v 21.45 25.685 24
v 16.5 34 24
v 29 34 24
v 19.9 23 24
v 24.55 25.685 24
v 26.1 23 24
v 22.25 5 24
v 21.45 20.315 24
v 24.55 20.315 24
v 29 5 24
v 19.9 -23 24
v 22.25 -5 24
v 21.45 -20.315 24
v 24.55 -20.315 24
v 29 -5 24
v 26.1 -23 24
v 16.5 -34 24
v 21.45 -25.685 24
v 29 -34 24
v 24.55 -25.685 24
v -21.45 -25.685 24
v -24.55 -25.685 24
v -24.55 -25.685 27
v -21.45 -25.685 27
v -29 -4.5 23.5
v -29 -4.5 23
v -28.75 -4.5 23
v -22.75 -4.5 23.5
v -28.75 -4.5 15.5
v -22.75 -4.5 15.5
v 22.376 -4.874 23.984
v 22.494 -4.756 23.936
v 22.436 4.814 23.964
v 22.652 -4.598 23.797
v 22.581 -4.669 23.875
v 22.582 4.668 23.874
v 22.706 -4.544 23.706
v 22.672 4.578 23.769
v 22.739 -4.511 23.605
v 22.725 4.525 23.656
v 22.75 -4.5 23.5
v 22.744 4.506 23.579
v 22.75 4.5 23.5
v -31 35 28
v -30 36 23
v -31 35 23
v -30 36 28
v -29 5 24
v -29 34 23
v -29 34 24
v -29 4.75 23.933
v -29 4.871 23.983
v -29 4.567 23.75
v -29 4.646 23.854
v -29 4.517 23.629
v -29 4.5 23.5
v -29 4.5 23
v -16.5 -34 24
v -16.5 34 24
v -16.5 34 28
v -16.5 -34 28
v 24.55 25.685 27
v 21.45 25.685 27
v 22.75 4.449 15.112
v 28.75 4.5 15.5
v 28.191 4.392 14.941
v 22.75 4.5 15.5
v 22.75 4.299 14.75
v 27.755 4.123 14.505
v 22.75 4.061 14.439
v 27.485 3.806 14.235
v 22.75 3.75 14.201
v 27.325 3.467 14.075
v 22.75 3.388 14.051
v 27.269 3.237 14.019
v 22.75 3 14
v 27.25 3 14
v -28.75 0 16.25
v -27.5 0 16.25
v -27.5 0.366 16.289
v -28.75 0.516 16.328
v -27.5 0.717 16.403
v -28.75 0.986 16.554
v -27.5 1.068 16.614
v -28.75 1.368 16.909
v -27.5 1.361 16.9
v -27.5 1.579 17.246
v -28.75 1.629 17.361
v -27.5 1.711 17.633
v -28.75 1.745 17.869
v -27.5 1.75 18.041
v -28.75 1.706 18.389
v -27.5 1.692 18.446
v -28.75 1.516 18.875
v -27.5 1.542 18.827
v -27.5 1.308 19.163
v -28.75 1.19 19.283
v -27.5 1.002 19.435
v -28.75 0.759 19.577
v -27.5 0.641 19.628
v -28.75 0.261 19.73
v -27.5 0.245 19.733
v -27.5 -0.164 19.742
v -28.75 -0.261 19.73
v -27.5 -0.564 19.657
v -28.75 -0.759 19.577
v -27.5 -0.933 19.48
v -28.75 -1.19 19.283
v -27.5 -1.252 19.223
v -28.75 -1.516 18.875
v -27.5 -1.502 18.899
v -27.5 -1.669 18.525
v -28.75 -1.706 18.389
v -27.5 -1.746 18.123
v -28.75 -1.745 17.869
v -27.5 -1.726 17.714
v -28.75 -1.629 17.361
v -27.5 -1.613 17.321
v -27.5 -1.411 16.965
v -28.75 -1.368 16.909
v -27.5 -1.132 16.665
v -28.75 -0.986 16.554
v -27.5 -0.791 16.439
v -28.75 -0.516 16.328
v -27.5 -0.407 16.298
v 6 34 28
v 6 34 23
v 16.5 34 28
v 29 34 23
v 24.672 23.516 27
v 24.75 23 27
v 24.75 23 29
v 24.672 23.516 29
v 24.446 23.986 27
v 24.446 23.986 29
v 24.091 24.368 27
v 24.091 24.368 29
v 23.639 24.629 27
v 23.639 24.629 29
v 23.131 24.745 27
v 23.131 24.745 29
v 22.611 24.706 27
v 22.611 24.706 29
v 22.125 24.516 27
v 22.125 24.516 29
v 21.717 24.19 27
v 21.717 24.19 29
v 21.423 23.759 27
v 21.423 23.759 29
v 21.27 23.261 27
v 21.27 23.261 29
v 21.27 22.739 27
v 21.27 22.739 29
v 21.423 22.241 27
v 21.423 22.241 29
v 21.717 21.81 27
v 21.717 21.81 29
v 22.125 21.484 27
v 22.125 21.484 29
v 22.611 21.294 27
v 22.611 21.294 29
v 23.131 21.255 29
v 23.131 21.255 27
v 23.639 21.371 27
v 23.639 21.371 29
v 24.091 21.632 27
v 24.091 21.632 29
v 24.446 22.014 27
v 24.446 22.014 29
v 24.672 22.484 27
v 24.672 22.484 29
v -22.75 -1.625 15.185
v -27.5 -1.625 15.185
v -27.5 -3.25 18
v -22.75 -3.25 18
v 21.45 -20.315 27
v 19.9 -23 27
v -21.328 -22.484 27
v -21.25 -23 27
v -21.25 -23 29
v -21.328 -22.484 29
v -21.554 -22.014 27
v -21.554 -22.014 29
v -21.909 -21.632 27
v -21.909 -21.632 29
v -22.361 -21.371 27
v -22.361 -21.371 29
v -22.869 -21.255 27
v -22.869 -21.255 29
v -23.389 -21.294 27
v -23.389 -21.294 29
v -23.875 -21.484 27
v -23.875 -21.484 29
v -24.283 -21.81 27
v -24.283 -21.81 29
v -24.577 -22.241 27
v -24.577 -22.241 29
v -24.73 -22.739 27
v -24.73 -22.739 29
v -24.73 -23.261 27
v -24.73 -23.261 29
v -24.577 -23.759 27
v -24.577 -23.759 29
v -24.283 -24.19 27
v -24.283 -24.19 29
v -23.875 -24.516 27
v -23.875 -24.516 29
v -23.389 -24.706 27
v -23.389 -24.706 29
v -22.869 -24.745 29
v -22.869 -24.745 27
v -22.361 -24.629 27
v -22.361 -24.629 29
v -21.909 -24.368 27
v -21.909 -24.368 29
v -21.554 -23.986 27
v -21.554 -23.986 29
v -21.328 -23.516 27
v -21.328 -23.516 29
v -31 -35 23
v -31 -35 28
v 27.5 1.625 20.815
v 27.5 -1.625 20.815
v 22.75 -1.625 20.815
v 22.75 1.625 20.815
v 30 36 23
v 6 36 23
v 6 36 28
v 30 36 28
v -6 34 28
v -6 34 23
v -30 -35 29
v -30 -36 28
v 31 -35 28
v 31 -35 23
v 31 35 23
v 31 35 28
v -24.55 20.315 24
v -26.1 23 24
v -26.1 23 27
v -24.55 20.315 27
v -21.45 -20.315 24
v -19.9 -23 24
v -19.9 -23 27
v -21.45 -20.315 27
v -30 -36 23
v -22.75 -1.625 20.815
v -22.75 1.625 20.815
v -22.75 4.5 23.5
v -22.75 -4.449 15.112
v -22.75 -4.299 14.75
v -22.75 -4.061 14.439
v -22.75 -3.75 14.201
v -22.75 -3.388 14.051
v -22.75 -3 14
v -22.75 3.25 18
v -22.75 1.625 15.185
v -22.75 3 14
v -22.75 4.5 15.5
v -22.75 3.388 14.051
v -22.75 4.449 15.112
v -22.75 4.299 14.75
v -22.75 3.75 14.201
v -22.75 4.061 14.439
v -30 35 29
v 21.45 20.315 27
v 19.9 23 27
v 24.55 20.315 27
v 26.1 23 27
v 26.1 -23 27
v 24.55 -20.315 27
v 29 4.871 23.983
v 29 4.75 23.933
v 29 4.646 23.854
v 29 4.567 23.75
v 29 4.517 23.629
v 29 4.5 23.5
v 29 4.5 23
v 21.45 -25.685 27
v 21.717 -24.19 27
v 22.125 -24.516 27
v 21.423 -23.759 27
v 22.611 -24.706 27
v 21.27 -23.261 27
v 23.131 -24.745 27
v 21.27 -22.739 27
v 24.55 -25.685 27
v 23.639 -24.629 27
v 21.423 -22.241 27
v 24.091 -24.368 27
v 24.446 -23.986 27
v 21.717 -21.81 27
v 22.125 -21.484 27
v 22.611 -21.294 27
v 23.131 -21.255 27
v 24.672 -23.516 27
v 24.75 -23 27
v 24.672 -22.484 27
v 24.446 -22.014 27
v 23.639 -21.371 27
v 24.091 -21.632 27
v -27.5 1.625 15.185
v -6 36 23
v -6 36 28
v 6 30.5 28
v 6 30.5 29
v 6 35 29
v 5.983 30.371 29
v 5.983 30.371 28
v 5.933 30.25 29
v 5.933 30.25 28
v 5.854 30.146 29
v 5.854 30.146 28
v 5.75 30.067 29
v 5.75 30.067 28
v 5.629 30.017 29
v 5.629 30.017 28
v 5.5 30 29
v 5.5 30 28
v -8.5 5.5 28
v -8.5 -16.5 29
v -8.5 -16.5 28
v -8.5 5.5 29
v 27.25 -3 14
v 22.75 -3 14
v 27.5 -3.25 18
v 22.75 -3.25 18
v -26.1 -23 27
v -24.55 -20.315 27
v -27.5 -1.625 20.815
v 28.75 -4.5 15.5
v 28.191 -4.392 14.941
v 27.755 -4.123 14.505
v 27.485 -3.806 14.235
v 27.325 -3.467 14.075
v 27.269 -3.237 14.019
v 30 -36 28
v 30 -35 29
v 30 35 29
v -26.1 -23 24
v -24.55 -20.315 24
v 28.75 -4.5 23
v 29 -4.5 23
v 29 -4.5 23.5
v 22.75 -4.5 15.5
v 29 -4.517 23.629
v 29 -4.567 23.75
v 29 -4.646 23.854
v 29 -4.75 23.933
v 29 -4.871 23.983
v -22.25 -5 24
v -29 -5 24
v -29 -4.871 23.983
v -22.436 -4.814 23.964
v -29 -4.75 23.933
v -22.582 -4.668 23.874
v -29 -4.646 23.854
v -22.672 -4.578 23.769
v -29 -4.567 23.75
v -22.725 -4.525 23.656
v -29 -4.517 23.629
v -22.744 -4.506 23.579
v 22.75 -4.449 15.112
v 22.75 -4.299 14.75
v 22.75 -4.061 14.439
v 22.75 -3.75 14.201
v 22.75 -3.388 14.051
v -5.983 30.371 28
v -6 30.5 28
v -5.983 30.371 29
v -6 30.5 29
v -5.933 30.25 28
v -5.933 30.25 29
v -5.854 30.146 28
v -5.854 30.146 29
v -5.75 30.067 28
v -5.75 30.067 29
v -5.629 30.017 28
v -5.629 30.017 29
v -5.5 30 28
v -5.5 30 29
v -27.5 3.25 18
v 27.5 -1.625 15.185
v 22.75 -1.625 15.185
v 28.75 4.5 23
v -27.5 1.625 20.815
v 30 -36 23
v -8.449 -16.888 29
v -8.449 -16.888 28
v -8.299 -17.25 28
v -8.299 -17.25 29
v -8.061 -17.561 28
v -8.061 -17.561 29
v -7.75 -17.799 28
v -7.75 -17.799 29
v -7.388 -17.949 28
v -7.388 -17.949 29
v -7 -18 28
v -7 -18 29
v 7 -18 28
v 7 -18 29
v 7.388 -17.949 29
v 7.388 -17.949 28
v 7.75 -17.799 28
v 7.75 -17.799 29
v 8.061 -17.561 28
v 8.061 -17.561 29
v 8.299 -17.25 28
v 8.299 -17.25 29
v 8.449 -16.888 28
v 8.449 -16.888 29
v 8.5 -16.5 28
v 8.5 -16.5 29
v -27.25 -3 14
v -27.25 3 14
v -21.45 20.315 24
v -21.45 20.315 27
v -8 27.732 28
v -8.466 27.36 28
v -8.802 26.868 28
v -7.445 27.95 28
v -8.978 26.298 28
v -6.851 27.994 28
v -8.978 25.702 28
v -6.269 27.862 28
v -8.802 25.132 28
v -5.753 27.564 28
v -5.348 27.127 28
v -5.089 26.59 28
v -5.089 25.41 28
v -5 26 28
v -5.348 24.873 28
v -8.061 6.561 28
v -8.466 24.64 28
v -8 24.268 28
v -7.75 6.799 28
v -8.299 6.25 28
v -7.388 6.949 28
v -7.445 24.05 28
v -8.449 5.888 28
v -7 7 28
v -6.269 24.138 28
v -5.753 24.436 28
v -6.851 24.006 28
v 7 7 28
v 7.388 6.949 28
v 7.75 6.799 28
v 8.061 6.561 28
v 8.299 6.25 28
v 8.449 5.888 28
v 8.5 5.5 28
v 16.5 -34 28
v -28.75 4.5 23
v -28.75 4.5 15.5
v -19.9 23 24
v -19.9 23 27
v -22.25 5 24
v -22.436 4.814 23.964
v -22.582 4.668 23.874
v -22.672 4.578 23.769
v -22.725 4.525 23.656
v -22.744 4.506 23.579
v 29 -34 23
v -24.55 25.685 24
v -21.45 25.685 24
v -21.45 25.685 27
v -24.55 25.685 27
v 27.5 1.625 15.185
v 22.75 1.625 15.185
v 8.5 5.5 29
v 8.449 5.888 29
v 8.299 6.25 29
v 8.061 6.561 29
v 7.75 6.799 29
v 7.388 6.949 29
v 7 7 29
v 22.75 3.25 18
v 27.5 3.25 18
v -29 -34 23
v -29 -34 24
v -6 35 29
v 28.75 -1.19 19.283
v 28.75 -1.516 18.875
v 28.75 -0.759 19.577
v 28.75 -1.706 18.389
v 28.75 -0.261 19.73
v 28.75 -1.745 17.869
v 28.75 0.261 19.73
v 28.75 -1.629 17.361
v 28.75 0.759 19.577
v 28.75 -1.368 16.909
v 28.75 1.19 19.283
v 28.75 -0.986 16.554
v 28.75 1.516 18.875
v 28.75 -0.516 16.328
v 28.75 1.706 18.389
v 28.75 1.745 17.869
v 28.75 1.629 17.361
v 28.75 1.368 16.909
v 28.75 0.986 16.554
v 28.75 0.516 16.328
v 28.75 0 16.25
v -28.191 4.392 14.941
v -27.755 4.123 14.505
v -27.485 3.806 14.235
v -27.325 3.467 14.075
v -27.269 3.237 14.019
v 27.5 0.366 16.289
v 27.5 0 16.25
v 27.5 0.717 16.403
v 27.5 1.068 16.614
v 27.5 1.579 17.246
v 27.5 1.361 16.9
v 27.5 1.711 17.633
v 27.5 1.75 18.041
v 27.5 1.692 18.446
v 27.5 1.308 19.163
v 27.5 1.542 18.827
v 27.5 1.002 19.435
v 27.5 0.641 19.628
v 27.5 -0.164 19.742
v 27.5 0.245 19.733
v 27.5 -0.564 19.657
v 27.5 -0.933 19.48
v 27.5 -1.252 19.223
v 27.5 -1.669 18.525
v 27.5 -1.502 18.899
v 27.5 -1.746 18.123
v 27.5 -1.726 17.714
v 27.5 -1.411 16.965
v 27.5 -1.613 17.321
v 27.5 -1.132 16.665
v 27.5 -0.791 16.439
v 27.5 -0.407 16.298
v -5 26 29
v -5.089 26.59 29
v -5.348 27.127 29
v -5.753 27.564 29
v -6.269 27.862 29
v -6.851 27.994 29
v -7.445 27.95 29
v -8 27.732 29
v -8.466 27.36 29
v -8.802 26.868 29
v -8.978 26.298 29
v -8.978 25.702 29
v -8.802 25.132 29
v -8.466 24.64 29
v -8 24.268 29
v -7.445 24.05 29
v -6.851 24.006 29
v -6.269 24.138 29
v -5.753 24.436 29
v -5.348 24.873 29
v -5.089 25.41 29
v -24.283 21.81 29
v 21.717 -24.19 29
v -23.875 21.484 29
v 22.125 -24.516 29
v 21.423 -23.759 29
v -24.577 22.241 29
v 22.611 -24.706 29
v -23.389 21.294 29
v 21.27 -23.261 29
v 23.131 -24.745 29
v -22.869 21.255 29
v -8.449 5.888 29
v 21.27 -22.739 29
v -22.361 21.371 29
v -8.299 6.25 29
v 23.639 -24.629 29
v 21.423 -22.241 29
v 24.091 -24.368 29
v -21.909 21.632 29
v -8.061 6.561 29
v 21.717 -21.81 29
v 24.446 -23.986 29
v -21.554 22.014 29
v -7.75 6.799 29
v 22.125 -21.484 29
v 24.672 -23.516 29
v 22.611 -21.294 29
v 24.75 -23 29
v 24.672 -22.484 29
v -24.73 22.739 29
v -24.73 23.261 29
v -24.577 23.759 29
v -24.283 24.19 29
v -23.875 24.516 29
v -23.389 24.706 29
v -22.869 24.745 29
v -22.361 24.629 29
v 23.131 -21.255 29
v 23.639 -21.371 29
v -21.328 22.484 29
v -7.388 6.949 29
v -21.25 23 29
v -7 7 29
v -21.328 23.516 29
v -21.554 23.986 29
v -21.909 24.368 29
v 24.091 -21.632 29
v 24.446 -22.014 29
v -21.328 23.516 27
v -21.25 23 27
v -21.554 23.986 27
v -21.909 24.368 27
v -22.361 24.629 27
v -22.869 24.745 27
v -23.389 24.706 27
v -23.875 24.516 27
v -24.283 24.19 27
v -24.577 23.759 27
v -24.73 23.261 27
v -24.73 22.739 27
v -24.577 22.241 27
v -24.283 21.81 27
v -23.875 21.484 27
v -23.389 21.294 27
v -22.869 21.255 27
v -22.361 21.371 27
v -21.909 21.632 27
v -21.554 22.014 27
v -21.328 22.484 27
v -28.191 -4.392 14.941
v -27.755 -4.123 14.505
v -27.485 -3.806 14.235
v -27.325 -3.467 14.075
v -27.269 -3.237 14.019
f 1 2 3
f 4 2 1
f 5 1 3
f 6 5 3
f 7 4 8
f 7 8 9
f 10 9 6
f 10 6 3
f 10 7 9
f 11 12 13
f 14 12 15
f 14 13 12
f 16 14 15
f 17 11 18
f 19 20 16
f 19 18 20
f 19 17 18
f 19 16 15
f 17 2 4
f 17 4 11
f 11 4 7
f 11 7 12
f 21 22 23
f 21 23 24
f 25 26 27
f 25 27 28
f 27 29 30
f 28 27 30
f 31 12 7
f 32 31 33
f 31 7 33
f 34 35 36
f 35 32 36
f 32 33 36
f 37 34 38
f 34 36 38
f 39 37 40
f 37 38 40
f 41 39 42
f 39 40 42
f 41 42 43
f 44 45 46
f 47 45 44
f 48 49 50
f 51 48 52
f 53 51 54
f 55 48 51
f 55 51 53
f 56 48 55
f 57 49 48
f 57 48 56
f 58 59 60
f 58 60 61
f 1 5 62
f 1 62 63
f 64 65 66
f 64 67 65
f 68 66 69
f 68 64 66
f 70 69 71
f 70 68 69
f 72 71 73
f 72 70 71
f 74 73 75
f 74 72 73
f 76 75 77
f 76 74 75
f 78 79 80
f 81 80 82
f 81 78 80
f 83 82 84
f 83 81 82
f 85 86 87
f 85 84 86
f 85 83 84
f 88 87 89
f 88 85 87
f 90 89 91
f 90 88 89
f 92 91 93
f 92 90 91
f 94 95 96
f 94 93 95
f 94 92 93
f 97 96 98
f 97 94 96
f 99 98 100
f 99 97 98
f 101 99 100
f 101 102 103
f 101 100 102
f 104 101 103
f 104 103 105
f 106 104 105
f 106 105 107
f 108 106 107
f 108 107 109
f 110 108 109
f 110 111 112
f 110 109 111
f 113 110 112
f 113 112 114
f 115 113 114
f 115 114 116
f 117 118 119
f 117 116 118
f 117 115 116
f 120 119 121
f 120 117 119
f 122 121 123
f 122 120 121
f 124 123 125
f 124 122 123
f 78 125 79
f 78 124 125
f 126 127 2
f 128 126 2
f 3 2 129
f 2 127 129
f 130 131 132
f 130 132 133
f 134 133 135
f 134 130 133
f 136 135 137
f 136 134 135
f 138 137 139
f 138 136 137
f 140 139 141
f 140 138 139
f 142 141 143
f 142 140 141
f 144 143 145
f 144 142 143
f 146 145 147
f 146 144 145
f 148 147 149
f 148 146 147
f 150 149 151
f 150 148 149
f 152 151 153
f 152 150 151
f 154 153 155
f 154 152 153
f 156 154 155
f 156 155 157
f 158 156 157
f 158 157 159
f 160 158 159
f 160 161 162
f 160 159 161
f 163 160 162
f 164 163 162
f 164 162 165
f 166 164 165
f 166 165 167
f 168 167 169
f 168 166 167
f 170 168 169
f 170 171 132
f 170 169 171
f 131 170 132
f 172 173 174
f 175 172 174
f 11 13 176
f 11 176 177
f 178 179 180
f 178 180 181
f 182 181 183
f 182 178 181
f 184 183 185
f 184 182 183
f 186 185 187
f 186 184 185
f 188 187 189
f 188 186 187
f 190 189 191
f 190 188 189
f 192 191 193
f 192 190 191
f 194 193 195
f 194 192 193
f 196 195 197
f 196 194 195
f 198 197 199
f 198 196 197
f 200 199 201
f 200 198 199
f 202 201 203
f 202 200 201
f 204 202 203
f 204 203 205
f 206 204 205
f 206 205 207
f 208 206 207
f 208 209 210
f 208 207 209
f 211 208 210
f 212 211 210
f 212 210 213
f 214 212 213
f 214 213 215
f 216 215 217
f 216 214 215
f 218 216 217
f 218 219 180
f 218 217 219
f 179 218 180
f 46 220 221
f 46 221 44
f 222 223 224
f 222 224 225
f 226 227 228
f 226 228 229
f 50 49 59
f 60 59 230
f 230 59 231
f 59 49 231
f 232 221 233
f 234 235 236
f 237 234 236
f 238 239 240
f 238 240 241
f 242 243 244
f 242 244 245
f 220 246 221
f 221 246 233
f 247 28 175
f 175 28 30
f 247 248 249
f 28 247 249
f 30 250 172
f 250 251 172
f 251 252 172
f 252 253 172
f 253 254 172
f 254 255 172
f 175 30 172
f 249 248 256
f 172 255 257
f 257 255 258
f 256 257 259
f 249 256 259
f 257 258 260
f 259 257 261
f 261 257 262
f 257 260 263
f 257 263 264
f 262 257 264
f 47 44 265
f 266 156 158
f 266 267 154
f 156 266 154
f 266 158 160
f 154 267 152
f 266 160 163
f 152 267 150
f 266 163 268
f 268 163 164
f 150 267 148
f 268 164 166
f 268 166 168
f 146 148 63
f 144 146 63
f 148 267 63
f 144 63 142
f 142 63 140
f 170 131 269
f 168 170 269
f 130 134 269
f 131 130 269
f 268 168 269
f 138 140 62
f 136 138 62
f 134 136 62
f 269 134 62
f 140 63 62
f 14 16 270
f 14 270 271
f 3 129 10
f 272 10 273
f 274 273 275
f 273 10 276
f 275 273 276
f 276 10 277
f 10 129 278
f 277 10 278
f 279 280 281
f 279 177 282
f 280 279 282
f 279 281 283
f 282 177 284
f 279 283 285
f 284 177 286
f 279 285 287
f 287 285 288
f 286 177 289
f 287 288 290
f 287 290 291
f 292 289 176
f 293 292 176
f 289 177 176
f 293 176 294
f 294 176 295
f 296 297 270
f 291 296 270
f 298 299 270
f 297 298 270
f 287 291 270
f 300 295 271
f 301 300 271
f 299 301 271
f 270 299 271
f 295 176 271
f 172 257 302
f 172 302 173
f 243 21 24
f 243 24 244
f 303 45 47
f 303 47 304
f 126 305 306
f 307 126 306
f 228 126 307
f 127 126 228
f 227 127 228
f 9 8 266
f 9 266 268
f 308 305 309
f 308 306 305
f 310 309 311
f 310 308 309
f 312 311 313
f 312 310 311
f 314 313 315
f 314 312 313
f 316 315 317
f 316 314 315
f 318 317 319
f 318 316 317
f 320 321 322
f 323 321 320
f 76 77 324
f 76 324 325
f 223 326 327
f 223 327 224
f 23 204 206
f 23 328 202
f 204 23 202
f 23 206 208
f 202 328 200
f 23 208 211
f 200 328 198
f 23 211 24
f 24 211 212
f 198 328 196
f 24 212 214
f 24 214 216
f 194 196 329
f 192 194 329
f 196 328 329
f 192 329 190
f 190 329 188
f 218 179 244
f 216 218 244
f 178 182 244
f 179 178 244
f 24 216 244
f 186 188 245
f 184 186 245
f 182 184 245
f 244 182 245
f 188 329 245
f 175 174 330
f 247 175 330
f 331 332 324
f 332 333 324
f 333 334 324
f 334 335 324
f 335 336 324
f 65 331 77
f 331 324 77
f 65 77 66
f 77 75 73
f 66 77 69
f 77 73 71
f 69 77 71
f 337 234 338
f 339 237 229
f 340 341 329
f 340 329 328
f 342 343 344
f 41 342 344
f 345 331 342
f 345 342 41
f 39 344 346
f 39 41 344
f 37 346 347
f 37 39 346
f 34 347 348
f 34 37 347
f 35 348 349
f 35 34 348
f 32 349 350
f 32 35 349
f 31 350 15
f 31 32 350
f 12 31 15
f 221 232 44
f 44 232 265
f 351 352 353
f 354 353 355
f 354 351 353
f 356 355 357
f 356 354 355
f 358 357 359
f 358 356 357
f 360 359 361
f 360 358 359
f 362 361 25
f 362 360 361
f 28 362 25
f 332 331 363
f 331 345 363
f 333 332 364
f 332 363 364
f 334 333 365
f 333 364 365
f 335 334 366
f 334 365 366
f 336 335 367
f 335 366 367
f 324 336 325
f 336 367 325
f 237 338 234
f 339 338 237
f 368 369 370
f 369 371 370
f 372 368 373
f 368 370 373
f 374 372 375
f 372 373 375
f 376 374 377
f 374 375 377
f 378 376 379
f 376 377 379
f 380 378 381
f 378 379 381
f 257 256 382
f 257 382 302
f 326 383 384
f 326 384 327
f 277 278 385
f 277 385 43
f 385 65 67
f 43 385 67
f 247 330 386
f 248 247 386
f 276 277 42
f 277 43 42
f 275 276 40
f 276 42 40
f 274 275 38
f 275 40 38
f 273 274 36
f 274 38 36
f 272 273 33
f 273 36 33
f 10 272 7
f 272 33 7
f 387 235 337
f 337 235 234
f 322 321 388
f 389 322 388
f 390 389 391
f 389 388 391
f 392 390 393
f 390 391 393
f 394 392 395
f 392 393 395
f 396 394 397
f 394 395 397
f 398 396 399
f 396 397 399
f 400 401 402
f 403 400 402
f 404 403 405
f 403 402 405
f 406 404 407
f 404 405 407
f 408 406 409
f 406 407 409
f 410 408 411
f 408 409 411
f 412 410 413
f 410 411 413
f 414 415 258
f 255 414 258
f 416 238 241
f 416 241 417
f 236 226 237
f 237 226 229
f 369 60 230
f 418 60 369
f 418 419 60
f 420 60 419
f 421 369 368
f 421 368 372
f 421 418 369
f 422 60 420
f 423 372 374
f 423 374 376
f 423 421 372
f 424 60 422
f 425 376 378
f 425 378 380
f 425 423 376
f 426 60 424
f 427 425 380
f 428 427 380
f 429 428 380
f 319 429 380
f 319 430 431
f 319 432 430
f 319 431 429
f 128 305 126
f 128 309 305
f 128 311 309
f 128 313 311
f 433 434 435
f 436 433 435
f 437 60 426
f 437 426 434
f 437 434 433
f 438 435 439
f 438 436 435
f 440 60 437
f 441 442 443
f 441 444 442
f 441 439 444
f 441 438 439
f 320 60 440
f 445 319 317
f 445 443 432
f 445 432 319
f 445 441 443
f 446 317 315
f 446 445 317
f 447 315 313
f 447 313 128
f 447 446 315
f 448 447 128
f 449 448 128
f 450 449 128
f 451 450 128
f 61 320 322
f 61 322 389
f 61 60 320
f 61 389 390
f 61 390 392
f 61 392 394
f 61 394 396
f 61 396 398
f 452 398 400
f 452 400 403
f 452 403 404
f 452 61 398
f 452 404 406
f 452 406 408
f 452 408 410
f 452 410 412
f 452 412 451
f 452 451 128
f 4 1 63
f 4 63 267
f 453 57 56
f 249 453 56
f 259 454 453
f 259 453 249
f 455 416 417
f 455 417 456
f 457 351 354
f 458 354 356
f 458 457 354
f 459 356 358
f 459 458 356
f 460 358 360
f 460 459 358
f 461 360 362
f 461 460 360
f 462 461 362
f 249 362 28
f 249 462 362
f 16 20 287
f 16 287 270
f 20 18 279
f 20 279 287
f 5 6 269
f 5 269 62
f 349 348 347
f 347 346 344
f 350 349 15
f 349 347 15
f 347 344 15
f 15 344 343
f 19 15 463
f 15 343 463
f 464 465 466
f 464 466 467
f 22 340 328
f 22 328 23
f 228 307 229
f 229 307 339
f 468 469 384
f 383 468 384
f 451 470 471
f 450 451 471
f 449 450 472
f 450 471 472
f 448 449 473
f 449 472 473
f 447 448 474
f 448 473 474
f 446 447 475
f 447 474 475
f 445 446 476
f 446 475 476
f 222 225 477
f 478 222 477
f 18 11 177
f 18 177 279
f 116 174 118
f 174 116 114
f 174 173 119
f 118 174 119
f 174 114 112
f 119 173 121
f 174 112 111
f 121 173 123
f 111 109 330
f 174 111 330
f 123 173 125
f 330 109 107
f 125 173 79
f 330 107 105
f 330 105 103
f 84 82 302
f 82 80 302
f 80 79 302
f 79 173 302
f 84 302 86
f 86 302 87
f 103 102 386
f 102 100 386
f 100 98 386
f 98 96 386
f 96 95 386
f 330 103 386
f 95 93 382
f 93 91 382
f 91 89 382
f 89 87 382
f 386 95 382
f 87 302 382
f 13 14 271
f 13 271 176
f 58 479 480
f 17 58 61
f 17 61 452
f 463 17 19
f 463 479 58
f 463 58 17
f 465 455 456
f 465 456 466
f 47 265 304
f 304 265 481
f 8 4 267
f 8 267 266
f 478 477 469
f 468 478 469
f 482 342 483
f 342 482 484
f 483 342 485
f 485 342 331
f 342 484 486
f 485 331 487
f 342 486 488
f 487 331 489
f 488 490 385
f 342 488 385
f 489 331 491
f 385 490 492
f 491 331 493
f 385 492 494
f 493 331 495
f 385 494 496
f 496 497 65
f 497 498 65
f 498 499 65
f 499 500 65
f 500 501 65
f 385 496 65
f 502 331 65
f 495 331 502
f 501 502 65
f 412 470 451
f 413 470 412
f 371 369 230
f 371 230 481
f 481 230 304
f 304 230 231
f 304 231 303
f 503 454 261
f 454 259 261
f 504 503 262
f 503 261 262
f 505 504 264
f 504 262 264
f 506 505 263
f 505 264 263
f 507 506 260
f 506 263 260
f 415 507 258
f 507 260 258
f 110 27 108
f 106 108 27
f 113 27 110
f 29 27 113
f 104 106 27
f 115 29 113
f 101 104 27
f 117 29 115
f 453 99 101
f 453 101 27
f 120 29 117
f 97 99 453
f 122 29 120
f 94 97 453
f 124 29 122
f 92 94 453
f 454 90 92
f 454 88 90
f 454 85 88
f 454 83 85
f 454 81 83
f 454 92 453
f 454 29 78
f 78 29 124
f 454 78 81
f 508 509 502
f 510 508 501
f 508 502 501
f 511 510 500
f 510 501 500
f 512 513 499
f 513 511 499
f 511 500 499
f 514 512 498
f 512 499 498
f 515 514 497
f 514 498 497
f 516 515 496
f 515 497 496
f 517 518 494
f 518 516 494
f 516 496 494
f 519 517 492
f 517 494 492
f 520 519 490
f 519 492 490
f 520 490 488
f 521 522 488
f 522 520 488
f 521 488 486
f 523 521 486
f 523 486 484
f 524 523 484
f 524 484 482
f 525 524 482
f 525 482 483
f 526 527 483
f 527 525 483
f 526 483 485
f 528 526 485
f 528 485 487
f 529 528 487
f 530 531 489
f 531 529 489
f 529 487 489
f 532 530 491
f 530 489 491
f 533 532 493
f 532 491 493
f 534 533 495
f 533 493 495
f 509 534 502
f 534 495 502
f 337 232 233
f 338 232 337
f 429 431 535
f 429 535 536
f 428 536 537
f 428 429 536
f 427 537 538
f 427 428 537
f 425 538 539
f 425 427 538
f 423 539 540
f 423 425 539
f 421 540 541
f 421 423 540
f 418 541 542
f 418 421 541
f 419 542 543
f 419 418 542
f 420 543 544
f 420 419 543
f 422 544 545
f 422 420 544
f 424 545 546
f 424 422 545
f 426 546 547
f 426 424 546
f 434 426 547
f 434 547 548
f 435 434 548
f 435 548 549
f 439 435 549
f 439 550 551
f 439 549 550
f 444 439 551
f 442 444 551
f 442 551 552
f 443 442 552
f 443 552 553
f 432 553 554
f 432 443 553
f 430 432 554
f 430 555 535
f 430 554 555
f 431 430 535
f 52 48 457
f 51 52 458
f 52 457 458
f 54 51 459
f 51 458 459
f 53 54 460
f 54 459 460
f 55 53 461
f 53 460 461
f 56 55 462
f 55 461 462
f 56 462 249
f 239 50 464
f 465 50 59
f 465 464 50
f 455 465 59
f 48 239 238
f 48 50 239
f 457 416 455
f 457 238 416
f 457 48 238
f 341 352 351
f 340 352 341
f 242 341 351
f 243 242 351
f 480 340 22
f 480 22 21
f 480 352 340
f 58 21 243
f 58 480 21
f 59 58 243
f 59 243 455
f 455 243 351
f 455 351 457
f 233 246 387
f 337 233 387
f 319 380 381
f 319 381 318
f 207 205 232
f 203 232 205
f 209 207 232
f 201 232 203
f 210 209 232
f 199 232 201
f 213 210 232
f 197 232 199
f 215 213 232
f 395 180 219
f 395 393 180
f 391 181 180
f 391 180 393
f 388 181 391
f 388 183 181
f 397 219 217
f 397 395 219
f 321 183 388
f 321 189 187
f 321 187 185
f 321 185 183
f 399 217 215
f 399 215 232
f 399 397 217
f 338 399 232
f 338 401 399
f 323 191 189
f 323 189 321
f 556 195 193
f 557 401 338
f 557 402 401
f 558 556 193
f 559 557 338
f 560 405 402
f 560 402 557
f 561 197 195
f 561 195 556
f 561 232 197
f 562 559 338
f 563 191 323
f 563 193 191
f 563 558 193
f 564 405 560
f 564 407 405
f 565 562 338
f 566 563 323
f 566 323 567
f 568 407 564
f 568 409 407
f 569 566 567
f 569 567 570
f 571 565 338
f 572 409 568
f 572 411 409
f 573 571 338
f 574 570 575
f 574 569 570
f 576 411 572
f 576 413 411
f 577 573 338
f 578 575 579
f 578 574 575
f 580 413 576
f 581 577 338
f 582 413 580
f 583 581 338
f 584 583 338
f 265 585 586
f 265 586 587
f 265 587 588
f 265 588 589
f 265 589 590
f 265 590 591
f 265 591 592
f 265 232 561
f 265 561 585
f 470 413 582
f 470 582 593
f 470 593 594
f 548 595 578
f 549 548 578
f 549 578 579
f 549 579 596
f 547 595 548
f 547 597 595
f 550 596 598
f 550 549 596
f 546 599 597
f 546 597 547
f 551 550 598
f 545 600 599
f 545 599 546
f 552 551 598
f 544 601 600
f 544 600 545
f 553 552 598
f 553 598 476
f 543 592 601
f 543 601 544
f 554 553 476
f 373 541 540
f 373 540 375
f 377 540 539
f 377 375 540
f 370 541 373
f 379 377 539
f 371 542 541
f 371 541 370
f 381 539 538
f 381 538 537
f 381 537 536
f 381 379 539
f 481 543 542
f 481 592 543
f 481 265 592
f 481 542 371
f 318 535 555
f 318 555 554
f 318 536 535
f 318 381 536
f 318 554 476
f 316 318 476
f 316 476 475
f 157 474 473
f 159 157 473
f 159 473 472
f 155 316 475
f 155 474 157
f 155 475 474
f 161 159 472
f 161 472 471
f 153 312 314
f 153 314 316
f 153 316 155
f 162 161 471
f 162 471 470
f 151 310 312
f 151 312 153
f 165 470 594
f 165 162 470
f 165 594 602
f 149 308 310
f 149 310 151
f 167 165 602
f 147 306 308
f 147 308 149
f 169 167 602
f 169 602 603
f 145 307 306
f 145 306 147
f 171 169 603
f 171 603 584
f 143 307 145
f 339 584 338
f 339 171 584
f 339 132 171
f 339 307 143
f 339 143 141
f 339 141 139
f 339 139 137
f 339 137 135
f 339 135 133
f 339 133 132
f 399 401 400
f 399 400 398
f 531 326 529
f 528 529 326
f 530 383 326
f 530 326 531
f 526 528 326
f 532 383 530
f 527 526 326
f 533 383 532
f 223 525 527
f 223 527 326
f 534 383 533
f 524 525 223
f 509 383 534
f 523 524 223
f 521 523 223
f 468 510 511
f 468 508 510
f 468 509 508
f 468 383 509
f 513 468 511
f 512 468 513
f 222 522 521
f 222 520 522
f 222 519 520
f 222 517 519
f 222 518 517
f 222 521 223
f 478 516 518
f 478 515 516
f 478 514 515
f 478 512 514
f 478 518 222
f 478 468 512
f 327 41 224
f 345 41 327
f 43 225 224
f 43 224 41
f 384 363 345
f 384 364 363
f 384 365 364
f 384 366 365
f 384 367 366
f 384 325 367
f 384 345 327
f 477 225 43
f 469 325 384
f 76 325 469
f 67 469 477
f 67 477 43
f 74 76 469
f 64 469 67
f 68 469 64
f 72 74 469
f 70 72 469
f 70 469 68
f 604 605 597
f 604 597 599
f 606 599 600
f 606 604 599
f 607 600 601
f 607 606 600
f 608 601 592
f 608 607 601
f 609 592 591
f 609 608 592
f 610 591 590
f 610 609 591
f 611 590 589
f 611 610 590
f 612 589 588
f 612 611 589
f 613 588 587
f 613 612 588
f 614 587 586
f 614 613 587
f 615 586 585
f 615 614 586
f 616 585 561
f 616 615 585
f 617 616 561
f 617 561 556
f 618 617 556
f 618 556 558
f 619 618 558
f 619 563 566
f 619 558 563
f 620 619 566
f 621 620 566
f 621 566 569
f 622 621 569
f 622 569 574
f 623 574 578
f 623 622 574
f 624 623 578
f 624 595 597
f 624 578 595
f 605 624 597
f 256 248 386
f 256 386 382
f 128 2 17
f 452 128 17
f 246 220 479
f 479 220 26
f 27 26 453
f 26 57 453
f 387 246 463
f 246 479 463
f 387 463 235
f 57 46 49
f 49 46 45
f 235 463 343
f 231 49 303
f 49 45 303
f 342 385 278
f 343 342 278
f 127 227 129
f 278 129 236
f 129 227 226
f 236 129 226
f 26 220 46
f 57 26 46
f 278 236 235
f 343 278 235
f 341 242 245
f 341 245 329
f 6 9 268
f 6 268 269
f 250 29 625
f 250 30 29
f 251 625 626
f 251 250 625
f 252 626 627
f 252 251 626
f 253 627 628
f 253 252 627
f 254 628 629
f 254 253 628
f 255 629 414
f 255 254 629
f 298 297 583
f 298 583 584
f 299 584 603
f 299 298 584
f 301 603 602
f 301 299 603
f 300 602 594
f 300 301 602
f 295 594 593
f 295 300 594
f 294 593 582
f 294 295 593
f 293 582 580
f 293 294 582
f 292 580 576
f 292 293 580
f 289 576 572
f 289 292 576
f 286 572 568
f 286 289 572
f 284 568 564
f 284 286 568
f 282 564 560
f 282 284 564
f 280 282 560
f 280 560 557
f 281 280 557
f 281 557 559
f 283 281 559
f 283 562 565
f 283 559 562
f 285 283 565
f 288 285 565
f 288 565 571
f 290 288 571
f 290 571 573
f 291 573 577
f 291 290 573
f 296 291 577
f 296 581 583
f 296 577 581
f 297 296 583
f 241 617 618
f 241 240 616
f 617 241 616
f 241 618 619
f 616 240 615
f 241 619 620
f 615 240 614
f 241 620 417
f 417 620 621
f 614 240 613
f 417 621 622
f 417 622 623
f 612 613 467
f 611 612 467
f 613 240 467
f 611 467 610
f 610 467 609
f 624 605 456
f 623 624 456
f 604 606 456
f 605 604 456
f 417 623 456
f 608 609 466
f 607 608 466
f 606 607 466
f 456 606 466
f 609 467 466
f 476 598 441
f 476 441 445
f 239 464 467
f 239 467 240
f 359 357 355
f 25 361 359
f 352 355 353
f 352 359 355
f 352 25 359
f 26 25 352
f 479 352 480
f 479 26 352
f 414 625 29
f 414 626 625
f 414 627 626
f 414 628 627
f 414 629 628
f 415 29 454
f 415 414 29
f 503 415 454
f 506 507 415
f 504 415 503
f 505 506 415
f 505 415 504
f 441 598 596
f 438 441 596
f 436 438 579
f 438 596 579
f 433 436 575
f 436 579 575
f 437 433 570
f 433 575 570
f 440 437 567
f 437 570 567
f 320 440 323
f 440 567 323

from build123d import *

# Parameters (mm, degrees)
CYLINDER021_R            = 2
CYLINDER021_DEPTH        = 15
BOX014_W                 = 4
BOX014_H                 = 9
BOX014_DEPTH             = 3
PRISM010_DEPTH           = 10
PRISM010_ROLL_ANGLE      = -90.000052
PRISM010_PITCH_ANGLE     = -59.999967
PRISM010_PLACEMENT_ANGLE = 90.000052
CYLINDER019_R            = 1.75
CYLINDER019_DEPTH        = 68
CYLINDER019_PITCH_ANGLE  = 90
BOX013_W                 = 6
BOX013_H                 = 9
BOX013_DEPTH             = 11
CHAMFER008_SIZE          = 1.5
FILLET009_R              = 1.5
BOX012_W                 = 12
BOX012_H                 = 16
BOX012_DEPTH             = 10
PAD021_DEPTH             = 35
CYLINDER005_R            = 1.75
CYLINDER005_DEPTH        = 50
CYLINDER007_R            = 1.75
CYLINDER007_DEPTH        = 50
CYLINDER006_R            = 1.75
CYLINDER006_DEPTH        = 50
CYLINDER004_R            = 1.75
CYLINDER004_DEPTH        = 50
PRISM004_DEPTH           = 10
PRISM005_DEPTH           = 10
PRISM006_DEPTH           = 10
PRISM007_DEPTH           = 10
SKETCH001_W              = 58
SKETCH001_H              = 68
PAD001_DEPTH             = 2
SKETCH002_W              = 33
SKETCH002_H              = 68
PAD002_DEPTH             = 6
BOX009_W                 = 62
BOX009_H                 = 72
BOX009_DEPTH             = 6
CHAMFER001_SIZE          = 1
FILLET010_R              = 0.5


with BuildPart() as cilindro017:
    # Cylinder021 → Cylinder021 (new body)
    with BuildSketch(Plane(origin=(-7, 26, 17), x_dir=(1, 0, 0), z_dir=(0, 0, 1))):
        Circle(CYLINDER021_R)
    extrude(amount=CYLINDER021_DEPTH)


with BuildPart() as cubo014:
    # Box014 → Box014 (new body)
    with BuildSketch(Plane(origin=(-29.75, -4.5, 23), x_dir=(1, 0, 0), z_dir=(0, 0, 1))):
        with Locations((2, 4.5)):
            Rectangle(BOX014_W, BOX014_H)
    extrude(amount=BOX014_DEPTH)


with BuildPart() as prisma010:
    # Prism010 → Prism010 (new body)
    with BuildSketch(Plane.XY):
        Polygon((3.25, 0), (1.625, 2.814583), (-1.625, 2.814583), (-3.25, 0), (-1.625, -2.814583), (1.625, -2.814583), align=None)
    extrude(amount=PRISM010_DEPTH)


with BuildPart() as prisma010_1:
    # Prism010 roll: moved
    add(prisma010.part.rotate(Axis((0, 0, 0), (1, 0, 0)), PRISM010_ROLL_ANGLE))


with BuildPart() as prisma010_2:
    # Prism010 pitch: moved
    add(prisma010_1.part.rotate(Axis((0, 0, 0), (0, 1, 0)), PRISM010_PITCH_ANGLE))


with BuildPart() as prisma010_3:
    # Prism010 placement: moved
    add(prisma010_2.part.moved(Location((-17.5, 0, 18))).rotate(Axis((-17.5, 0, 18), (0, 0, 1)), PRISM010_PLACEMENT_ANGLE))


with BuildPart() as cilindro016:
    # Cylinder019 → Cylinder019 (new body)
    with BuildSketch(Plane.XY):
        Circle(CYLINDER019_R)
    extrude(amount=CYLINDER019_DEPTH)


with BuildPart() as cilindro016_1:
    # Cylinder019 pitch: moved
    add(cilindro016.part.rotate(Axis((0, 0, 0), (0, 1, 0)), CYLINDER019_PITCH_ANGLE))


with BuildPart() as cilindro016_2:
    # Cylinder019 placement: moved
    add(cilindro016_1.part.moved(Location((-34, 0, 18))))


with BuildPart() as fusion016:
    # Box013 → Box013 (new body)
    with BuildSketch(Plane(origin=(-28.75, -4.5, 14), x_dir=(1, 0, 0), z_dir=(0, 0, 1))):
        with Locations((3, 4.5)):
            Rectangle(BOX013_W, BOX013_H)
    extrude(amount=BOX013_DEPTH)

    # Cut028: cut Cilindro016
    add(cilindro016_2.part, mode=Mode.SUBTRACT)

    # Chamfer008
    chamfer008_edges = [fusion016.edges().sort_by_distance(p)[0] for p in [
        (-28.75, 0, 14),
    ]]
    chamfer(chamfer008_edges, length=CHAMFER008_SIZE)

    # Fillet009
    fillet009_edges = [fusion016.edges().sort_by_distance(p)[0] for p in [
        (-25, -4.5, 14),
        (-25, 4.5, 14),
    ]]
    fillet(fillet009_edges, radius=FILLET009_R)

    # Cut029: cut Prisma010
    add(prisma010_3.part, mode=Mode.SUBTRACT)

    # Fusion016: union Cubo014
    add(cubo014.part)


with BuildPart() as part_mirroring032:
    # Part__Mirroring032: instance of Fusion016
    add(fusion016.part.mirror(Plane(origin=(0, 0, 0), x_dir=(0, -1, 0), z_dir=(1, 0, 0))))


with BuildPart() as fusion017:
    # Fusion017 base: copy of Fusion016
    add(fusion016.part)

    # Fusion017: union Part__Mirroring032
    add(part_mirroring032.part)


with BuildPart() as cubo012:
    # Box012 → Box012 (new body)
    with BuildSketch(Plane(origin=(-6, 30, 22), x_dir=(1, 0, 0), z_dir=(0, 0, 1))):
        with Locations((6, 8)):
            Rectangle(BOX012_W, BOX012_H)
    extrude(amount=BOX012_DEPTH)


with BuildPart() as pad021:
    # Sketch018 → Pad021 (new body)
    with BuildSketch(Plane.XY.offset(40)):
        with BuildLine():
            Line((-7, 7), (7, 7))
            ThreePointArc((8.5, 5.5), (8.06066, 6.56066), (7, 7))
            Line((8.5, 5.5), (8.5, -16.5))
            ThreePointArc((7, -18), (8.06066, -17.56066), (8.5, -16.5))
            Line((7, -18), (-7, -18))
            ThreePointArc((-8.5, -16.5), (-8.06066, -17.56066), (-7, -18))
            Line((-8.5, -16.5), (-8.5, 5.5))
            ThreePointArc((-7, 7), (-8.06066, 6.56066), (-8.5, 5.5))
        make_face()
    extrude(amount=-PAD021_DEPTH)


with BuildPart() as cilindro005:
    # Cylinder005 → Cylinder005 (new body)
    with BuildSketch(Plane(origin=(23, 23, -15), x_dir=(1, 0, 0), z_dir=(0, 0, 1))):
        Circle(CYLINDER005_R)
    extrude(amount=CYLINDER005_DEPTH)


with BuildPart() as cilindro007:
    # Cylinder007 → Cylinder007 (new body)
    with BuildSketch(Plane(origin=(23, -23, -15), x_dir=(1, 0, 0), z_dir=(0, 0, 1))):
        Circle(CYLINDER007_R)
    extrude(amount=CYLINDER007_DEPTH)


with BuildPart() as cilindro006:
    # Cylinder006 → Cylinder006 (new body)
    with BuildSketch(Plane(origin=(-23, -23, -15), x_dir=(1, 0, 0), z_dir=(0, 0, 1))):
        Circle(CYLINDER006_R)
    extrude(amount=CYLINDER006_DEPTH)


with BuildPart() as fusion002:
    # Cylinder004 → Cylinder004 (new body)
    with BuildSketch(Plane(origin=(-23, 23, -15), x_dir=(1, 0, 0), z_dir=(0, 0, 1))):
        Circle(CYLINDER004_R)
    extrude(amount=CYLINDER004_DEPTH)

    # Fusion002: union Cilindro005, Cilindro007, Cilindro006
    add(cilindro005.part)
    add(cilindro007.part)
    add(cilindro006.part)


with BuildPart() as prisma004:
    # Prism004 → Prism004 (new body)
    with BuildSketch(Plane(origin=(-23, 23, 0), x_dir=(1, 0, 0), z_dir=(0, 0, 1))):
        Polygon((3.1, 0), (1.55, 2.684679), (-1.55, 2.684679), (-3.1, 0), (-1.55, -2.684679), (1.55, -2.684679), align=None)
    extrude(amount=PRISM004_DEPTH)


with BuildPart() as prisma005:
    # Prism005 → Prism005 (new body)
    with BuildSketch(Plane(origin=(23, 23, 0), x_dir=(1, 0, 0), z_dir=(0, 0, 1))):
        Polygon((3.1, 0), (1.55, 2.684679), (-1.55, 2.684679), (-3.1, 0), (-1.55, -2.684679), (1.55, -2.684679), align=None)
    extrude(amount=PRISM005_DEPTH)


with BuildPart() as prisma006:
    # Prism006 → Prism006 (new body)
    with BuildSketch(Plane(origin=(-23, -23, 0), x_dir=(1, 0, 0), z_dir=(0, 0, 1))):
        Polygon((3.1, 0), (1.55, 2.684679), (-1.55, 2.684679), (-3.1, 0), (-1.55, -2.684679), (1.55, -2.684679), align=None)
    extrude(amount=PRISM006_DEPTH)


with BuildPart() as fusion004:
    # Prism007 → Prism007 (new body)
    with BuildSketch(Plane(origin=(23, -23, 0), x_dir=(1, 0, 0), z_dir=(0, 0, 1))):
        Polygon((3.1, 0), (1.55, 2.684679), (-1.55, 2.684679), (-3.1, 0), (-1.55, -2.684679), (1.55, -2.684679), align=None)
    extrude(amount=PRISM007_DEPTH)

    # Fusion004: union Prisma004, Prisma005, Prisma006
    add(prisma004.part)
    add(prisma005.part)
    add(prisma006.part)


with BuildPart() as fusion004_1:
    # Fusion004 placement: moved
    add(fusion004.part.moved(Location((0, 0, 17))))


with BuildPart() as pad001:
    # Sketch001 → Pad001 (new body)
    with BuildSketch(Plane(origin=(0, 0, 23), x_dir=(1, 0, 0), z_dir=(0, 0, -1))):
        Rectangle(SKETCH001_W, SKETCH001_H)
    extrude(amount=-PAD001_DEPTH)


with BuildPart() as fusion003:
    # Sketch002 → Pad002 (new body)
    with BuildSketch(Plane(origin=(0, 0, 23), x_dir=(1, 0, 0), z_dir=(0, 0, -1))):
        Rectangle(SKETCH002_W, SKETCH002_H)
    extrude(amount=-PAD002_DEPTH)

    # Fusion003: union Pad001
    add(pad001.part)


with BuildPart() as fusion003_1:
    # Fusion003 placement: moved
    add(fusion003.part.moved(Location((0, 0, -1))))


with BuildPart() as clone_of_bodya:
    # Box009 → Box009 (new body)
    with BuildSketch(Plane(origin=(-31, -36, 23), x_dir=(1, 0, 0), z_dir=(0, 0, 1))):
        with Locations((31, 36)):
            Rectangle(BOX009_W, BOX009_H)
    extrude(amount=BOX009_DEPTH)

    # Chamfer001
    chamfer001_edges = [clone_of_bodya.edges().sort_by_distance(p)[0] for p in [
        (-31, -36, 26),
        (-31, 0, 29),
        (-31, 36, 26),
        (31, -36, 26),
        (31, 0, 29),
        (31, 36, 26),
        (0, -36, 29),
        (0, 36, 29),
    ]]
    chamfer(chamfer001_edges, length=CHAMFER001_SIZE)

    # Cut004: cut Fusion003
    add(fusion003_1.part, mode=Mode.SUBTRACT)

    # Cut005: cut Fusion004
    add(fusion004_1.part, mode=Mode.SUBTRACT)

    # Cut006: cut Fusion002
    add(fusion002.part, mode=Mode.SUBTRACT)

    # Cut023: cut Pad021
    add(pad021.part, mode=Mode.SUBTRACT)

    # Cut027: cut Cubo012
    add(cubo012.part, mode=Mode.SUBTRACT)

    # Fusion018: union Fusion017
    add(fusion017.part)

    # Fillet010
    fillet010_edges = [clone_of_bodya.edges().sort_by_distance(p)[0] for p in [
        (-6, 30, 28.5),
        (6, 30, 28.5),
        (-24.25, 4.5, 24),
        (-22.75, 0, 24),
        (-24.25, -4.5, 24),
        (28.875, -4.5, 24),
        (24.25, -4.5, 24),
        (22.75, 0, 24),
        (24.25, 4.5, 24),
    ]]
    fillet(fillet010_edges, radius=FILLET010_R)

    # Cut032: cut Cilindro017
    add(cilindro017.part, mode=Mode.SUBTRACT)


solid = clone_of_bodya.part
